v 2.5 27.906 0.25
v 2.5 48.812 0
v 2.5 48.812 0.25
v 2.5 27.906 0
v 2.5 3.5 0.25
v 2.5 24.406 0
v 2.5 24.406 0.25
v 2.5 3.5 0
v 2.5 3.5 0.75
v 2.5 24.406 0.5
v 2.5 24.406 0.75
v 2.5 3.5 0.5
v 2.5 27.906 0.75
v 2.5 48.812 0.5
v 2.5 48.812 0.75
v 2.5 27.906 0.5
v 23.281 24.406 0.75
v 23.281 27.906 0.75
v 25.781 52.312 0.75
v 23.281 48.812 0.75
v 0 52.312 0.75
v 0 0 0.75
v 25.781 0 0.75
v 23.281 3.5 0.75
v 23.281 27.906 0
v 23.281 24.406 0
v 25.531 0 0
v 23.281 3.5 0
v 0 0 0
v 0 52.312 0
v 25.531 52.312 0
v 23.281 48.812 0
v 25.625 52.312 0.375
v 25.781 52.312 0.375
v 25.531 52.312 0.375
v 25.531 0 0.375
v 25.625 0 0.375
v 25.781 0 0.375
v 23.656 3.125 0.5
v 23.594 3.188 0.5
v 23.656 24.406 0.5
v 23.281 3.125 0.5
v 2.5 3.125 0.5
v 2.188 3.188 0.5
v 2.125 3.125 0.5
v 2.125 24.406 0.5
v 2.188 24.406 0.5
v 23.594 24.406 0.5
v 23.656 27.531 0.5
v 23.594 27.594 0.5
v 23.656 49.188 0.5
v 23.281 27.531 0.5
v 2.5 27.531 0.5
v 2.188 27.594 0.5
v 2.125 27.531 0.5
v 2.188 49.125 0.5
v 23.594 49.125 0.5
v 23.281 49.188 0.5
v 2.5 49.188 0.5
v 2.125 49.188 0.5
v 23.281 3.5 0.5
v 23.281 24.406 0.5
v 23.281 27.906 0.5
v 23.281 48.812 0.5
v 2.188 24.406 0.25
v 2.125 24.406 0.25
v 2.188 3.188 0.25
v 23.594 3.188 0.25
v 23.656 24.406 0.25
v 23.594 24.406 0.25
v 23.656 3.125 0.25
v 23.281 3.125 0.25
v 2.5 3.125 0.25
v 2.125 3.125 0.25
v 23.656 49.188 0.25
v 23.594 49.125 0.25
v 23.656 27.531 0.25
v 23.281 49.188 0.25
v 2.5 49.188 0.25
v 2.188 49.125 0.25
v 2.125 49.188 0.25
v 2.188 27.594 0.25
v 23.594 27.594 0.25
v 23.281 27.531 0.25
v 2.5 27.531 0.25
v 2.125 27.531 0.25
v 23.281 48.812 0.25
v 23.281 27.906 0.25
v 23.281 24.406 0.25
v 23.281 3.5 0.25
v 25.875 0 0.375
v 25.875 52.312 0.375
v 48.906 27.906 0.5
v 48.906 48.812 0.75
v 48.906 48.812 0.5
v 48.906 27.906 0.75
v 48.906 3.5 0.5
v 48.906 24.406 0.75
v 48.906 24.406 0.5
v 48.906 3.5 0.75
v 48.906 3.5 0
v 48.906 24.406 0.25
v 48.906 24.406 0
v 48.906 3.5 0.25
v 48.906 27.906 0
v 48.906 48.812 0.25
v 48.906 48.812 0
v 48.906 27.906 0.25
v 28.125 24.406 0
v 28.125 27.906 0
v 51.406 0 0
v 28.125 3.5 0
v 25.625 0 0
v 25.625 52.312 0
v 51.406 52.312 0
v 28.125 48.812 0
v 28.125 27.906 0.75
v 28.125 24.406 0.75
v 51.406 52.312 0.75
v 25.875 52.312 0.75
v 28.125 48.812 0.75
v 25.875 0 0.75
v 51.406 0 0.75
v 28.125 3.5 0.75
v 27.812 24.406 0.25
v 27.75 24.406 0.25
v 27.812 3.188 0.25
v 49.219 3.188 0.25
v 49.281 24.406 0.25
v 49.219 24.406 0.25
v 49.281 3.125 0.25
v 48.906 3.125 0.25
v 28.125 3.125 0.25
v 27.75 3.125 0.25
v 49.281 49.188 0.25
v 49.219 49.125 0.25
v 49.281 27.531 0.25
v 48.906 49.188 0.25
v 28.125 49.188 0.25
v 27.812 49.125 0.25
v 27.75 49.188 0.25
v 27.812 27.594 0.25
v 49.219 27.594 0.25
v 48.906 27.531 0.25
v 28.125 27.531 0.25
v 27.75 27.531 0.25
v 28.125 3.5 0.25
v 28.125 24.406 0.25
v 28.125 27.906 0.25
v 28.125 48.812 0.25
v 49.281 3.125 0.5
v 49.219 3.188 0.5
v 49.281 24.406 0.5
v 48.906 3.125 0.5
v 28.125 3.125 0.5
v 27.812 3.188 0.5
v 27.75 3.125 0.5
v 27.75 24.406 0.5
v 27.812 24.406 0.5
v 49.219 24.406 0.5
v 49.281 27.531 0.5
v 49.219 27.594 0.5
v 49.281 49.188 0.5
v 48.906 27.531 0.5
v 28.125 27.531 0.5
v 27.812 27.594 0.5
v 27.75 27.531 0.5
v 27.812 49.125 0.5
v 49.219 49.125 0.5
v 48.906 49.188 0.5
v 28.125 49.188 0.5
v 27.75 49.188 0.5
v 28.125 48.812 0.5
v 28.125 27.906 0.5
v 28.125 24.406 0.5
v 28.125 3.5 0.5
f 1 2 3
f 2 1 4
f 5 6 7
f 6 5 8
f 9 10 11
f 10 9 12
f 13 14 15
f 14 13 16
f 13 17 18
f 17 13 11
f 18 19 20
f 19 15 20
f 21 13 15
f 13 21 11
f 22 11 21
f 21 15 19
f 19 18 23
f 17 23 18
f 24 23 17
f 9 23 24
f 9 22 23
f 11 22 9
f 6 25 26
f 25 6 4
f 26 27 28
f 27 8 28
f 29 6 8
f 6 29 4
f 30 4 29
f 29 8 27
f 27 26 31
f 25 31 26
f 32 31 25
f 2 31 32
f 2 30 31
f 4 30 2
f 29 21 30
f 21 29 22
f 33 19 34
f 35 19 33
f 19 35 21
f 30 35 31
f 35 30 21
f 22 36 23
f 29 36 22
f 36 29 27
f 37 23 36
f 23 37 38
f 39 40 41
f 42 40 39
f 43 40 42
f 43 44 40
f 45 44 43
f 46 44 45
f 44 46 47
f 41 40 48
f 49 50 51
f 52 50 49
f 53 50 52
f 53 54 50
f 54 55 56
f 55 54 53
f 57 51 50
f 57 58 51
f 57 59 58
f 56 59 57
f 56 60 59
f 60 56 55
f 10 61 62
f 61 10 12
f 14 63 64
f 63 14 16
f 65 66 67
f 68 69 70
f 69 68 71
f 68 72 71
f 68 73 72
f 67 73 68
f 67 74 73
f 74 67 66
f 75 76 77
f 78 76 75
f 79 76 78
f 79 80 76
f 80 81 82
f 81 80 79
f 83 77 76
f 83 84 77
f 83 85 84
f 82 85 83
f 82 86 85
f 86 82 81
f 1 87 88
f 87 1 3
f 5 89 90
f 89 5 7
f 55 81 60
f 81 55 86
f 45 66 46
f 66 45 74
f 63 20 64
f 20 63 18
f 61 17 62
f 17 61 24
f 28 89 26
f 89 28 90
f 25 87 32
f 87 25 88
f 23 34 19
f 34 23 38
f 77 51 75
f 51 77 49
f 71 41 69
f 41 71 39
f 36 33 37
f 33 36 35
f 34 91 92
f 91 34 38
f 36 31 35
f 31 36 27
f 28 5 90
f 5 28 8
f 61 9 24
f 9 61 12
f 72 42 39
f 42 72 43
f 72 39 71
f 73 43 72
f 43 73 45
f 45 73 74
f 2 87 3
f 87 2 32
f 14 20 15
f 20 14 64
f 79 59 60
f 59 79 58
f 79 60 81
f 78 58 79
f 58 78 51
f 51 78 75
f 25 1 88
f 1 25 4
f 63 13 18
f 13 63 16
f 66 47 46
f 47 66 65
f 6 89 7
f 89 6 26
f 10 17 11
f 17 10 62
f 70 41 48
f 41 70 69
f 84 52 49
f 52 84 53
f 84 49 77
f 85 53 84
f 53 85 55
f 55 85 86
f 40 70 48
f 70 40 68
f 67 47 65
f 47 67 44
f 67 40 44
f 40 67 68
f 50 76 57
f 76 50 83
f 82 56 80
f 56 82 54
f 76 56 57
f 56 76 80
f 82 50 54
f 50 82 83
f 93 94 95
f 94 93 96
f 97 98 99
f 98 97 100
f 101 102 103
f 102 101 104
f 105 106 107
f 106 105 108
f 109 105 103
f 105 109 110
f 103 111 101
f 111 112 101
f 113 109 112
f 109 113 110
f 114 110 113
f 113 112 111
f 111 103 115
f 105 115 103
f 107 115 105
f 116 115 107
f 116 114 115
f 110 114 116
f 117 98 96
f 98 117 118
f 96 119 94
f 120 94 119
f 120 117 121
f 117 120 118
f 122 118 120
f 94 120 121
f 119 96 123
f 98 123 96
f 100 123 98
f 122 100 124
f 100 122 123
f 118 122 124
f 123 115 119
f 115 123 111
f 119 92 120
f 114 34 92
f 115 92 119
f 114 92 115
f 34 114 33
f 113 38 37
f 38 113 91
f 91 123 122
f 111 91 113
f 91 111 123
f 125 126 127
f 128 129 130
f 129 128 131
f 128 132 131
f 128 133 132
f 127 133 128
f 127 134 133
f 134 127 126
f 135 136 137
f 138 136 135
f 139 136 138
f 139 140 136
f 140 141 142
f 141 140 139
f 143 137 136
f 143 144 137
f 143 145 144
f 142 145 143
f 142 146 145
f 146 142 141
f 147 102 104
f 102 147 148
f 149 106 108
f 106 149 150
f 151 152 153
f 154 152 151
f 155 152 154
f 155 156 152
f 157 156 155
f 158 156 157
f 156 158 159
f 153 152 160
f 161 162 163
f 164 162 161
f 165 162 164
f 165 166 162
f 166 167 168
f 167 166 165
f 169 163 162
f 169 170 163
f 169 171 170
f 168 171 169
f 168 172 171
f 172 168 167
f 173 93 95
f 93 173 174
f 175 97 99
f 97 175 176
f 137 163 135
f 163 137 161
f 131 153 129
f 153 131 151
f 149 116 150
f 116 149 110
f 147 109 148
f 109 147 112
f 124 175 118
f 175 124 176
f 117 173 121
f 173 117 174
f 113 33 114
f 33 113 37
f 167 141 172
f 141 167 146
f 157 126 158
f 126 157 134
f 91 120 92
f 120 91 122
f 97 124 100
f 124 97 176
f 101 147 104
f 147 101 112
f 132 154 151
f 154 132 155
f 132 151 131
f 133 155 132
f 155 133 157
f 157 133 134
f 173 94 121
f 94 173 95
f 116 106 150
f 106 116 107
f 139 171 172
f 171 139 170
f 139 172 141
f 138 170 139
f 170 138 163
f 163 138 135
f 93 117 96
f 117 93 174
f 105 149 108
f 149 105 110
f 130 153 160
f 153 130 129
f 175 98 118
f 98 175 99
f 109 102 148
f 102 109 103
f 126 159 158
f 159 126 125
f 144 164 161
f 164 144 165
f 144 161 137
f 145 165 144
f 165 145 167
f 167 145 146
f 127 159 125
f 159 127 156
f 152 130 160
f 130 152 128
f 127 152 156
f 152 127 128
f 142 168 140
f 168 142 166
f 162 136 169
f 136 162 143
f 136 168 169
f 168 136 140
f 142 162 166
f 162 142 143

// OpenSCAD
/// All units are inches unless otherwise noted
// Window opening size
h_window = 52.5;
w_window = 31 + 1/16;

// Panel slot depth (validate by experiment)
d_slot = 3/8;
// Panel slot width (cut to fit)
w_slot = 1/4;

// Frame thickness
t_frame = 3/4;
// Stile width (measure stock for actual dimension)
w_stile = 2.5;
// rail width (measure stock for actual dimension)
w_rail = 3.5;

// Gap between window frame and shutter
frame_gap = 3/32;
// Gap between window shutters
center_gap = 3/32;

// Center overlap between shutters
shutter_overlap = 1/4;

// Gap between panel and rails and stiles to allow for
// expasion and contraction
panel_gap = 1/16;

// Panel thickness
t_panel = 1/4;

// number of shutter leaves
n_leaves = 2;

// Stile length
l_stile = h_window - 2 * frame_gap;
// Rail length visible
l_rail_visible = (w_window - 2 * frame_gap - center_gap 
        - 2 * n_leaves * w_stile);
// Rail length to cut
l_rail_cut = l_rail_visible  + 2 * d_slot;

mid_rail_center = 4/8 * l_stile;

w_leaf= 2 * w_stile + l_rail_visible; 

// A shutter is two leaves
leaf();
translate([2 * w_leaf + center_gap - shutter_overlap, 0, t_frame]) mirror([0, 0, 1]) mirror([1, 0, 0]) leaf();

// A leaf is 2 stiles, 3 rails (top, middle, bottom) and 2 panels
module leaf() {
    stile();
    difference() {
        translate([2 * w_stile + l_rail_visible,0,0]) mirror([1, 0, 0])stile();
        translate([2 * w_stile + l_rail_visible - shutter_overlap, 0, 0]) cube([shutter_overlap, l_stile, t_frame/2]);
    }
    
    color([0, 0.5, 0]) {
        x_rail = w_stile - d_slot;
        translate([x_rail, 0, 0]) rail();
        translate([x_rail, l_stile, 0]) mirror([0, 1, 0]) rail();
        translate([x_rail, mid_rail_center - w_rail/2, 0]) rail();
        
    }
    
    color([0, 0, 0.7]) {
        // center position
        panel_x = w_stile + l_rail_visible/2;
        bot_panel_y = (mid_rail_center + w_rail/2)/2;
        top_panel_y = (mid_rail_center + l_stile - w_rail/2)/2;
        w_panel = l_rail_visible + 2 * (d_slot - panel_gap);
        h_panel_bot = mid_rail_center - 3/2*w_rail + 2 * (d_slot - panel_gap);
        h_panel_top = l_stile - mid_rail_center - 3/2*w_rail + 2 * (d_slot - panel_gap);
        translate([panel_x, bot_panel_y, t_frame/2]) cube([w_panel, h_panel_bot, t_panel], center=true);
        translate([panel_x, top_panel_y, t_frame/2]) cube([w_panel, h_panel_top, t_panel], center=true);
    }
}

module stile()
{
    difference() {
        cube([w_stile, l_stile, t_frame]);
        translate([w_stile-d_slot,0,(t_frame-w_slot)/2]) cube([d_slot, l_stile, w_slot]);
    }
}

module rail()
{
    difference() {
        cube([l_rail_cut, w_rail, t_frame]);
        translate([0, w_rail-d_slot,(t_frame-w_slot)/2]) cube([l_rail_cut, d_slot, w_slot]);
        // Tenons
        cube([d_slot,w_rail, (t_frame-w_slot)/2]);
        translate([0,0,t_frame]) mirror ([0, 0, 1]) cube([d_slot,w_rail, (t_frame-w_slot)/2]);
        translate([l_rail_cut, 0, 0]) mirror ([1, 0, 0]) cube([d_slot,w_rail, (t_frame-w_slot)/2]);
        translate([l_rail_cut, 0, t_frame]) mirror([1, 0, 0]) mirror ([0, 0, 1]) cube([d_slot,w_rail, (t_frame-w_slot)/2]);
    }
}

// rail with slots on both sides
module mid_rail()
{
    difference() {
        rail();
        translate([0, 0,(t_frame-w_slot)/2]) cube([l_rail_cut, d_slot, w_slot]);
    }
}
